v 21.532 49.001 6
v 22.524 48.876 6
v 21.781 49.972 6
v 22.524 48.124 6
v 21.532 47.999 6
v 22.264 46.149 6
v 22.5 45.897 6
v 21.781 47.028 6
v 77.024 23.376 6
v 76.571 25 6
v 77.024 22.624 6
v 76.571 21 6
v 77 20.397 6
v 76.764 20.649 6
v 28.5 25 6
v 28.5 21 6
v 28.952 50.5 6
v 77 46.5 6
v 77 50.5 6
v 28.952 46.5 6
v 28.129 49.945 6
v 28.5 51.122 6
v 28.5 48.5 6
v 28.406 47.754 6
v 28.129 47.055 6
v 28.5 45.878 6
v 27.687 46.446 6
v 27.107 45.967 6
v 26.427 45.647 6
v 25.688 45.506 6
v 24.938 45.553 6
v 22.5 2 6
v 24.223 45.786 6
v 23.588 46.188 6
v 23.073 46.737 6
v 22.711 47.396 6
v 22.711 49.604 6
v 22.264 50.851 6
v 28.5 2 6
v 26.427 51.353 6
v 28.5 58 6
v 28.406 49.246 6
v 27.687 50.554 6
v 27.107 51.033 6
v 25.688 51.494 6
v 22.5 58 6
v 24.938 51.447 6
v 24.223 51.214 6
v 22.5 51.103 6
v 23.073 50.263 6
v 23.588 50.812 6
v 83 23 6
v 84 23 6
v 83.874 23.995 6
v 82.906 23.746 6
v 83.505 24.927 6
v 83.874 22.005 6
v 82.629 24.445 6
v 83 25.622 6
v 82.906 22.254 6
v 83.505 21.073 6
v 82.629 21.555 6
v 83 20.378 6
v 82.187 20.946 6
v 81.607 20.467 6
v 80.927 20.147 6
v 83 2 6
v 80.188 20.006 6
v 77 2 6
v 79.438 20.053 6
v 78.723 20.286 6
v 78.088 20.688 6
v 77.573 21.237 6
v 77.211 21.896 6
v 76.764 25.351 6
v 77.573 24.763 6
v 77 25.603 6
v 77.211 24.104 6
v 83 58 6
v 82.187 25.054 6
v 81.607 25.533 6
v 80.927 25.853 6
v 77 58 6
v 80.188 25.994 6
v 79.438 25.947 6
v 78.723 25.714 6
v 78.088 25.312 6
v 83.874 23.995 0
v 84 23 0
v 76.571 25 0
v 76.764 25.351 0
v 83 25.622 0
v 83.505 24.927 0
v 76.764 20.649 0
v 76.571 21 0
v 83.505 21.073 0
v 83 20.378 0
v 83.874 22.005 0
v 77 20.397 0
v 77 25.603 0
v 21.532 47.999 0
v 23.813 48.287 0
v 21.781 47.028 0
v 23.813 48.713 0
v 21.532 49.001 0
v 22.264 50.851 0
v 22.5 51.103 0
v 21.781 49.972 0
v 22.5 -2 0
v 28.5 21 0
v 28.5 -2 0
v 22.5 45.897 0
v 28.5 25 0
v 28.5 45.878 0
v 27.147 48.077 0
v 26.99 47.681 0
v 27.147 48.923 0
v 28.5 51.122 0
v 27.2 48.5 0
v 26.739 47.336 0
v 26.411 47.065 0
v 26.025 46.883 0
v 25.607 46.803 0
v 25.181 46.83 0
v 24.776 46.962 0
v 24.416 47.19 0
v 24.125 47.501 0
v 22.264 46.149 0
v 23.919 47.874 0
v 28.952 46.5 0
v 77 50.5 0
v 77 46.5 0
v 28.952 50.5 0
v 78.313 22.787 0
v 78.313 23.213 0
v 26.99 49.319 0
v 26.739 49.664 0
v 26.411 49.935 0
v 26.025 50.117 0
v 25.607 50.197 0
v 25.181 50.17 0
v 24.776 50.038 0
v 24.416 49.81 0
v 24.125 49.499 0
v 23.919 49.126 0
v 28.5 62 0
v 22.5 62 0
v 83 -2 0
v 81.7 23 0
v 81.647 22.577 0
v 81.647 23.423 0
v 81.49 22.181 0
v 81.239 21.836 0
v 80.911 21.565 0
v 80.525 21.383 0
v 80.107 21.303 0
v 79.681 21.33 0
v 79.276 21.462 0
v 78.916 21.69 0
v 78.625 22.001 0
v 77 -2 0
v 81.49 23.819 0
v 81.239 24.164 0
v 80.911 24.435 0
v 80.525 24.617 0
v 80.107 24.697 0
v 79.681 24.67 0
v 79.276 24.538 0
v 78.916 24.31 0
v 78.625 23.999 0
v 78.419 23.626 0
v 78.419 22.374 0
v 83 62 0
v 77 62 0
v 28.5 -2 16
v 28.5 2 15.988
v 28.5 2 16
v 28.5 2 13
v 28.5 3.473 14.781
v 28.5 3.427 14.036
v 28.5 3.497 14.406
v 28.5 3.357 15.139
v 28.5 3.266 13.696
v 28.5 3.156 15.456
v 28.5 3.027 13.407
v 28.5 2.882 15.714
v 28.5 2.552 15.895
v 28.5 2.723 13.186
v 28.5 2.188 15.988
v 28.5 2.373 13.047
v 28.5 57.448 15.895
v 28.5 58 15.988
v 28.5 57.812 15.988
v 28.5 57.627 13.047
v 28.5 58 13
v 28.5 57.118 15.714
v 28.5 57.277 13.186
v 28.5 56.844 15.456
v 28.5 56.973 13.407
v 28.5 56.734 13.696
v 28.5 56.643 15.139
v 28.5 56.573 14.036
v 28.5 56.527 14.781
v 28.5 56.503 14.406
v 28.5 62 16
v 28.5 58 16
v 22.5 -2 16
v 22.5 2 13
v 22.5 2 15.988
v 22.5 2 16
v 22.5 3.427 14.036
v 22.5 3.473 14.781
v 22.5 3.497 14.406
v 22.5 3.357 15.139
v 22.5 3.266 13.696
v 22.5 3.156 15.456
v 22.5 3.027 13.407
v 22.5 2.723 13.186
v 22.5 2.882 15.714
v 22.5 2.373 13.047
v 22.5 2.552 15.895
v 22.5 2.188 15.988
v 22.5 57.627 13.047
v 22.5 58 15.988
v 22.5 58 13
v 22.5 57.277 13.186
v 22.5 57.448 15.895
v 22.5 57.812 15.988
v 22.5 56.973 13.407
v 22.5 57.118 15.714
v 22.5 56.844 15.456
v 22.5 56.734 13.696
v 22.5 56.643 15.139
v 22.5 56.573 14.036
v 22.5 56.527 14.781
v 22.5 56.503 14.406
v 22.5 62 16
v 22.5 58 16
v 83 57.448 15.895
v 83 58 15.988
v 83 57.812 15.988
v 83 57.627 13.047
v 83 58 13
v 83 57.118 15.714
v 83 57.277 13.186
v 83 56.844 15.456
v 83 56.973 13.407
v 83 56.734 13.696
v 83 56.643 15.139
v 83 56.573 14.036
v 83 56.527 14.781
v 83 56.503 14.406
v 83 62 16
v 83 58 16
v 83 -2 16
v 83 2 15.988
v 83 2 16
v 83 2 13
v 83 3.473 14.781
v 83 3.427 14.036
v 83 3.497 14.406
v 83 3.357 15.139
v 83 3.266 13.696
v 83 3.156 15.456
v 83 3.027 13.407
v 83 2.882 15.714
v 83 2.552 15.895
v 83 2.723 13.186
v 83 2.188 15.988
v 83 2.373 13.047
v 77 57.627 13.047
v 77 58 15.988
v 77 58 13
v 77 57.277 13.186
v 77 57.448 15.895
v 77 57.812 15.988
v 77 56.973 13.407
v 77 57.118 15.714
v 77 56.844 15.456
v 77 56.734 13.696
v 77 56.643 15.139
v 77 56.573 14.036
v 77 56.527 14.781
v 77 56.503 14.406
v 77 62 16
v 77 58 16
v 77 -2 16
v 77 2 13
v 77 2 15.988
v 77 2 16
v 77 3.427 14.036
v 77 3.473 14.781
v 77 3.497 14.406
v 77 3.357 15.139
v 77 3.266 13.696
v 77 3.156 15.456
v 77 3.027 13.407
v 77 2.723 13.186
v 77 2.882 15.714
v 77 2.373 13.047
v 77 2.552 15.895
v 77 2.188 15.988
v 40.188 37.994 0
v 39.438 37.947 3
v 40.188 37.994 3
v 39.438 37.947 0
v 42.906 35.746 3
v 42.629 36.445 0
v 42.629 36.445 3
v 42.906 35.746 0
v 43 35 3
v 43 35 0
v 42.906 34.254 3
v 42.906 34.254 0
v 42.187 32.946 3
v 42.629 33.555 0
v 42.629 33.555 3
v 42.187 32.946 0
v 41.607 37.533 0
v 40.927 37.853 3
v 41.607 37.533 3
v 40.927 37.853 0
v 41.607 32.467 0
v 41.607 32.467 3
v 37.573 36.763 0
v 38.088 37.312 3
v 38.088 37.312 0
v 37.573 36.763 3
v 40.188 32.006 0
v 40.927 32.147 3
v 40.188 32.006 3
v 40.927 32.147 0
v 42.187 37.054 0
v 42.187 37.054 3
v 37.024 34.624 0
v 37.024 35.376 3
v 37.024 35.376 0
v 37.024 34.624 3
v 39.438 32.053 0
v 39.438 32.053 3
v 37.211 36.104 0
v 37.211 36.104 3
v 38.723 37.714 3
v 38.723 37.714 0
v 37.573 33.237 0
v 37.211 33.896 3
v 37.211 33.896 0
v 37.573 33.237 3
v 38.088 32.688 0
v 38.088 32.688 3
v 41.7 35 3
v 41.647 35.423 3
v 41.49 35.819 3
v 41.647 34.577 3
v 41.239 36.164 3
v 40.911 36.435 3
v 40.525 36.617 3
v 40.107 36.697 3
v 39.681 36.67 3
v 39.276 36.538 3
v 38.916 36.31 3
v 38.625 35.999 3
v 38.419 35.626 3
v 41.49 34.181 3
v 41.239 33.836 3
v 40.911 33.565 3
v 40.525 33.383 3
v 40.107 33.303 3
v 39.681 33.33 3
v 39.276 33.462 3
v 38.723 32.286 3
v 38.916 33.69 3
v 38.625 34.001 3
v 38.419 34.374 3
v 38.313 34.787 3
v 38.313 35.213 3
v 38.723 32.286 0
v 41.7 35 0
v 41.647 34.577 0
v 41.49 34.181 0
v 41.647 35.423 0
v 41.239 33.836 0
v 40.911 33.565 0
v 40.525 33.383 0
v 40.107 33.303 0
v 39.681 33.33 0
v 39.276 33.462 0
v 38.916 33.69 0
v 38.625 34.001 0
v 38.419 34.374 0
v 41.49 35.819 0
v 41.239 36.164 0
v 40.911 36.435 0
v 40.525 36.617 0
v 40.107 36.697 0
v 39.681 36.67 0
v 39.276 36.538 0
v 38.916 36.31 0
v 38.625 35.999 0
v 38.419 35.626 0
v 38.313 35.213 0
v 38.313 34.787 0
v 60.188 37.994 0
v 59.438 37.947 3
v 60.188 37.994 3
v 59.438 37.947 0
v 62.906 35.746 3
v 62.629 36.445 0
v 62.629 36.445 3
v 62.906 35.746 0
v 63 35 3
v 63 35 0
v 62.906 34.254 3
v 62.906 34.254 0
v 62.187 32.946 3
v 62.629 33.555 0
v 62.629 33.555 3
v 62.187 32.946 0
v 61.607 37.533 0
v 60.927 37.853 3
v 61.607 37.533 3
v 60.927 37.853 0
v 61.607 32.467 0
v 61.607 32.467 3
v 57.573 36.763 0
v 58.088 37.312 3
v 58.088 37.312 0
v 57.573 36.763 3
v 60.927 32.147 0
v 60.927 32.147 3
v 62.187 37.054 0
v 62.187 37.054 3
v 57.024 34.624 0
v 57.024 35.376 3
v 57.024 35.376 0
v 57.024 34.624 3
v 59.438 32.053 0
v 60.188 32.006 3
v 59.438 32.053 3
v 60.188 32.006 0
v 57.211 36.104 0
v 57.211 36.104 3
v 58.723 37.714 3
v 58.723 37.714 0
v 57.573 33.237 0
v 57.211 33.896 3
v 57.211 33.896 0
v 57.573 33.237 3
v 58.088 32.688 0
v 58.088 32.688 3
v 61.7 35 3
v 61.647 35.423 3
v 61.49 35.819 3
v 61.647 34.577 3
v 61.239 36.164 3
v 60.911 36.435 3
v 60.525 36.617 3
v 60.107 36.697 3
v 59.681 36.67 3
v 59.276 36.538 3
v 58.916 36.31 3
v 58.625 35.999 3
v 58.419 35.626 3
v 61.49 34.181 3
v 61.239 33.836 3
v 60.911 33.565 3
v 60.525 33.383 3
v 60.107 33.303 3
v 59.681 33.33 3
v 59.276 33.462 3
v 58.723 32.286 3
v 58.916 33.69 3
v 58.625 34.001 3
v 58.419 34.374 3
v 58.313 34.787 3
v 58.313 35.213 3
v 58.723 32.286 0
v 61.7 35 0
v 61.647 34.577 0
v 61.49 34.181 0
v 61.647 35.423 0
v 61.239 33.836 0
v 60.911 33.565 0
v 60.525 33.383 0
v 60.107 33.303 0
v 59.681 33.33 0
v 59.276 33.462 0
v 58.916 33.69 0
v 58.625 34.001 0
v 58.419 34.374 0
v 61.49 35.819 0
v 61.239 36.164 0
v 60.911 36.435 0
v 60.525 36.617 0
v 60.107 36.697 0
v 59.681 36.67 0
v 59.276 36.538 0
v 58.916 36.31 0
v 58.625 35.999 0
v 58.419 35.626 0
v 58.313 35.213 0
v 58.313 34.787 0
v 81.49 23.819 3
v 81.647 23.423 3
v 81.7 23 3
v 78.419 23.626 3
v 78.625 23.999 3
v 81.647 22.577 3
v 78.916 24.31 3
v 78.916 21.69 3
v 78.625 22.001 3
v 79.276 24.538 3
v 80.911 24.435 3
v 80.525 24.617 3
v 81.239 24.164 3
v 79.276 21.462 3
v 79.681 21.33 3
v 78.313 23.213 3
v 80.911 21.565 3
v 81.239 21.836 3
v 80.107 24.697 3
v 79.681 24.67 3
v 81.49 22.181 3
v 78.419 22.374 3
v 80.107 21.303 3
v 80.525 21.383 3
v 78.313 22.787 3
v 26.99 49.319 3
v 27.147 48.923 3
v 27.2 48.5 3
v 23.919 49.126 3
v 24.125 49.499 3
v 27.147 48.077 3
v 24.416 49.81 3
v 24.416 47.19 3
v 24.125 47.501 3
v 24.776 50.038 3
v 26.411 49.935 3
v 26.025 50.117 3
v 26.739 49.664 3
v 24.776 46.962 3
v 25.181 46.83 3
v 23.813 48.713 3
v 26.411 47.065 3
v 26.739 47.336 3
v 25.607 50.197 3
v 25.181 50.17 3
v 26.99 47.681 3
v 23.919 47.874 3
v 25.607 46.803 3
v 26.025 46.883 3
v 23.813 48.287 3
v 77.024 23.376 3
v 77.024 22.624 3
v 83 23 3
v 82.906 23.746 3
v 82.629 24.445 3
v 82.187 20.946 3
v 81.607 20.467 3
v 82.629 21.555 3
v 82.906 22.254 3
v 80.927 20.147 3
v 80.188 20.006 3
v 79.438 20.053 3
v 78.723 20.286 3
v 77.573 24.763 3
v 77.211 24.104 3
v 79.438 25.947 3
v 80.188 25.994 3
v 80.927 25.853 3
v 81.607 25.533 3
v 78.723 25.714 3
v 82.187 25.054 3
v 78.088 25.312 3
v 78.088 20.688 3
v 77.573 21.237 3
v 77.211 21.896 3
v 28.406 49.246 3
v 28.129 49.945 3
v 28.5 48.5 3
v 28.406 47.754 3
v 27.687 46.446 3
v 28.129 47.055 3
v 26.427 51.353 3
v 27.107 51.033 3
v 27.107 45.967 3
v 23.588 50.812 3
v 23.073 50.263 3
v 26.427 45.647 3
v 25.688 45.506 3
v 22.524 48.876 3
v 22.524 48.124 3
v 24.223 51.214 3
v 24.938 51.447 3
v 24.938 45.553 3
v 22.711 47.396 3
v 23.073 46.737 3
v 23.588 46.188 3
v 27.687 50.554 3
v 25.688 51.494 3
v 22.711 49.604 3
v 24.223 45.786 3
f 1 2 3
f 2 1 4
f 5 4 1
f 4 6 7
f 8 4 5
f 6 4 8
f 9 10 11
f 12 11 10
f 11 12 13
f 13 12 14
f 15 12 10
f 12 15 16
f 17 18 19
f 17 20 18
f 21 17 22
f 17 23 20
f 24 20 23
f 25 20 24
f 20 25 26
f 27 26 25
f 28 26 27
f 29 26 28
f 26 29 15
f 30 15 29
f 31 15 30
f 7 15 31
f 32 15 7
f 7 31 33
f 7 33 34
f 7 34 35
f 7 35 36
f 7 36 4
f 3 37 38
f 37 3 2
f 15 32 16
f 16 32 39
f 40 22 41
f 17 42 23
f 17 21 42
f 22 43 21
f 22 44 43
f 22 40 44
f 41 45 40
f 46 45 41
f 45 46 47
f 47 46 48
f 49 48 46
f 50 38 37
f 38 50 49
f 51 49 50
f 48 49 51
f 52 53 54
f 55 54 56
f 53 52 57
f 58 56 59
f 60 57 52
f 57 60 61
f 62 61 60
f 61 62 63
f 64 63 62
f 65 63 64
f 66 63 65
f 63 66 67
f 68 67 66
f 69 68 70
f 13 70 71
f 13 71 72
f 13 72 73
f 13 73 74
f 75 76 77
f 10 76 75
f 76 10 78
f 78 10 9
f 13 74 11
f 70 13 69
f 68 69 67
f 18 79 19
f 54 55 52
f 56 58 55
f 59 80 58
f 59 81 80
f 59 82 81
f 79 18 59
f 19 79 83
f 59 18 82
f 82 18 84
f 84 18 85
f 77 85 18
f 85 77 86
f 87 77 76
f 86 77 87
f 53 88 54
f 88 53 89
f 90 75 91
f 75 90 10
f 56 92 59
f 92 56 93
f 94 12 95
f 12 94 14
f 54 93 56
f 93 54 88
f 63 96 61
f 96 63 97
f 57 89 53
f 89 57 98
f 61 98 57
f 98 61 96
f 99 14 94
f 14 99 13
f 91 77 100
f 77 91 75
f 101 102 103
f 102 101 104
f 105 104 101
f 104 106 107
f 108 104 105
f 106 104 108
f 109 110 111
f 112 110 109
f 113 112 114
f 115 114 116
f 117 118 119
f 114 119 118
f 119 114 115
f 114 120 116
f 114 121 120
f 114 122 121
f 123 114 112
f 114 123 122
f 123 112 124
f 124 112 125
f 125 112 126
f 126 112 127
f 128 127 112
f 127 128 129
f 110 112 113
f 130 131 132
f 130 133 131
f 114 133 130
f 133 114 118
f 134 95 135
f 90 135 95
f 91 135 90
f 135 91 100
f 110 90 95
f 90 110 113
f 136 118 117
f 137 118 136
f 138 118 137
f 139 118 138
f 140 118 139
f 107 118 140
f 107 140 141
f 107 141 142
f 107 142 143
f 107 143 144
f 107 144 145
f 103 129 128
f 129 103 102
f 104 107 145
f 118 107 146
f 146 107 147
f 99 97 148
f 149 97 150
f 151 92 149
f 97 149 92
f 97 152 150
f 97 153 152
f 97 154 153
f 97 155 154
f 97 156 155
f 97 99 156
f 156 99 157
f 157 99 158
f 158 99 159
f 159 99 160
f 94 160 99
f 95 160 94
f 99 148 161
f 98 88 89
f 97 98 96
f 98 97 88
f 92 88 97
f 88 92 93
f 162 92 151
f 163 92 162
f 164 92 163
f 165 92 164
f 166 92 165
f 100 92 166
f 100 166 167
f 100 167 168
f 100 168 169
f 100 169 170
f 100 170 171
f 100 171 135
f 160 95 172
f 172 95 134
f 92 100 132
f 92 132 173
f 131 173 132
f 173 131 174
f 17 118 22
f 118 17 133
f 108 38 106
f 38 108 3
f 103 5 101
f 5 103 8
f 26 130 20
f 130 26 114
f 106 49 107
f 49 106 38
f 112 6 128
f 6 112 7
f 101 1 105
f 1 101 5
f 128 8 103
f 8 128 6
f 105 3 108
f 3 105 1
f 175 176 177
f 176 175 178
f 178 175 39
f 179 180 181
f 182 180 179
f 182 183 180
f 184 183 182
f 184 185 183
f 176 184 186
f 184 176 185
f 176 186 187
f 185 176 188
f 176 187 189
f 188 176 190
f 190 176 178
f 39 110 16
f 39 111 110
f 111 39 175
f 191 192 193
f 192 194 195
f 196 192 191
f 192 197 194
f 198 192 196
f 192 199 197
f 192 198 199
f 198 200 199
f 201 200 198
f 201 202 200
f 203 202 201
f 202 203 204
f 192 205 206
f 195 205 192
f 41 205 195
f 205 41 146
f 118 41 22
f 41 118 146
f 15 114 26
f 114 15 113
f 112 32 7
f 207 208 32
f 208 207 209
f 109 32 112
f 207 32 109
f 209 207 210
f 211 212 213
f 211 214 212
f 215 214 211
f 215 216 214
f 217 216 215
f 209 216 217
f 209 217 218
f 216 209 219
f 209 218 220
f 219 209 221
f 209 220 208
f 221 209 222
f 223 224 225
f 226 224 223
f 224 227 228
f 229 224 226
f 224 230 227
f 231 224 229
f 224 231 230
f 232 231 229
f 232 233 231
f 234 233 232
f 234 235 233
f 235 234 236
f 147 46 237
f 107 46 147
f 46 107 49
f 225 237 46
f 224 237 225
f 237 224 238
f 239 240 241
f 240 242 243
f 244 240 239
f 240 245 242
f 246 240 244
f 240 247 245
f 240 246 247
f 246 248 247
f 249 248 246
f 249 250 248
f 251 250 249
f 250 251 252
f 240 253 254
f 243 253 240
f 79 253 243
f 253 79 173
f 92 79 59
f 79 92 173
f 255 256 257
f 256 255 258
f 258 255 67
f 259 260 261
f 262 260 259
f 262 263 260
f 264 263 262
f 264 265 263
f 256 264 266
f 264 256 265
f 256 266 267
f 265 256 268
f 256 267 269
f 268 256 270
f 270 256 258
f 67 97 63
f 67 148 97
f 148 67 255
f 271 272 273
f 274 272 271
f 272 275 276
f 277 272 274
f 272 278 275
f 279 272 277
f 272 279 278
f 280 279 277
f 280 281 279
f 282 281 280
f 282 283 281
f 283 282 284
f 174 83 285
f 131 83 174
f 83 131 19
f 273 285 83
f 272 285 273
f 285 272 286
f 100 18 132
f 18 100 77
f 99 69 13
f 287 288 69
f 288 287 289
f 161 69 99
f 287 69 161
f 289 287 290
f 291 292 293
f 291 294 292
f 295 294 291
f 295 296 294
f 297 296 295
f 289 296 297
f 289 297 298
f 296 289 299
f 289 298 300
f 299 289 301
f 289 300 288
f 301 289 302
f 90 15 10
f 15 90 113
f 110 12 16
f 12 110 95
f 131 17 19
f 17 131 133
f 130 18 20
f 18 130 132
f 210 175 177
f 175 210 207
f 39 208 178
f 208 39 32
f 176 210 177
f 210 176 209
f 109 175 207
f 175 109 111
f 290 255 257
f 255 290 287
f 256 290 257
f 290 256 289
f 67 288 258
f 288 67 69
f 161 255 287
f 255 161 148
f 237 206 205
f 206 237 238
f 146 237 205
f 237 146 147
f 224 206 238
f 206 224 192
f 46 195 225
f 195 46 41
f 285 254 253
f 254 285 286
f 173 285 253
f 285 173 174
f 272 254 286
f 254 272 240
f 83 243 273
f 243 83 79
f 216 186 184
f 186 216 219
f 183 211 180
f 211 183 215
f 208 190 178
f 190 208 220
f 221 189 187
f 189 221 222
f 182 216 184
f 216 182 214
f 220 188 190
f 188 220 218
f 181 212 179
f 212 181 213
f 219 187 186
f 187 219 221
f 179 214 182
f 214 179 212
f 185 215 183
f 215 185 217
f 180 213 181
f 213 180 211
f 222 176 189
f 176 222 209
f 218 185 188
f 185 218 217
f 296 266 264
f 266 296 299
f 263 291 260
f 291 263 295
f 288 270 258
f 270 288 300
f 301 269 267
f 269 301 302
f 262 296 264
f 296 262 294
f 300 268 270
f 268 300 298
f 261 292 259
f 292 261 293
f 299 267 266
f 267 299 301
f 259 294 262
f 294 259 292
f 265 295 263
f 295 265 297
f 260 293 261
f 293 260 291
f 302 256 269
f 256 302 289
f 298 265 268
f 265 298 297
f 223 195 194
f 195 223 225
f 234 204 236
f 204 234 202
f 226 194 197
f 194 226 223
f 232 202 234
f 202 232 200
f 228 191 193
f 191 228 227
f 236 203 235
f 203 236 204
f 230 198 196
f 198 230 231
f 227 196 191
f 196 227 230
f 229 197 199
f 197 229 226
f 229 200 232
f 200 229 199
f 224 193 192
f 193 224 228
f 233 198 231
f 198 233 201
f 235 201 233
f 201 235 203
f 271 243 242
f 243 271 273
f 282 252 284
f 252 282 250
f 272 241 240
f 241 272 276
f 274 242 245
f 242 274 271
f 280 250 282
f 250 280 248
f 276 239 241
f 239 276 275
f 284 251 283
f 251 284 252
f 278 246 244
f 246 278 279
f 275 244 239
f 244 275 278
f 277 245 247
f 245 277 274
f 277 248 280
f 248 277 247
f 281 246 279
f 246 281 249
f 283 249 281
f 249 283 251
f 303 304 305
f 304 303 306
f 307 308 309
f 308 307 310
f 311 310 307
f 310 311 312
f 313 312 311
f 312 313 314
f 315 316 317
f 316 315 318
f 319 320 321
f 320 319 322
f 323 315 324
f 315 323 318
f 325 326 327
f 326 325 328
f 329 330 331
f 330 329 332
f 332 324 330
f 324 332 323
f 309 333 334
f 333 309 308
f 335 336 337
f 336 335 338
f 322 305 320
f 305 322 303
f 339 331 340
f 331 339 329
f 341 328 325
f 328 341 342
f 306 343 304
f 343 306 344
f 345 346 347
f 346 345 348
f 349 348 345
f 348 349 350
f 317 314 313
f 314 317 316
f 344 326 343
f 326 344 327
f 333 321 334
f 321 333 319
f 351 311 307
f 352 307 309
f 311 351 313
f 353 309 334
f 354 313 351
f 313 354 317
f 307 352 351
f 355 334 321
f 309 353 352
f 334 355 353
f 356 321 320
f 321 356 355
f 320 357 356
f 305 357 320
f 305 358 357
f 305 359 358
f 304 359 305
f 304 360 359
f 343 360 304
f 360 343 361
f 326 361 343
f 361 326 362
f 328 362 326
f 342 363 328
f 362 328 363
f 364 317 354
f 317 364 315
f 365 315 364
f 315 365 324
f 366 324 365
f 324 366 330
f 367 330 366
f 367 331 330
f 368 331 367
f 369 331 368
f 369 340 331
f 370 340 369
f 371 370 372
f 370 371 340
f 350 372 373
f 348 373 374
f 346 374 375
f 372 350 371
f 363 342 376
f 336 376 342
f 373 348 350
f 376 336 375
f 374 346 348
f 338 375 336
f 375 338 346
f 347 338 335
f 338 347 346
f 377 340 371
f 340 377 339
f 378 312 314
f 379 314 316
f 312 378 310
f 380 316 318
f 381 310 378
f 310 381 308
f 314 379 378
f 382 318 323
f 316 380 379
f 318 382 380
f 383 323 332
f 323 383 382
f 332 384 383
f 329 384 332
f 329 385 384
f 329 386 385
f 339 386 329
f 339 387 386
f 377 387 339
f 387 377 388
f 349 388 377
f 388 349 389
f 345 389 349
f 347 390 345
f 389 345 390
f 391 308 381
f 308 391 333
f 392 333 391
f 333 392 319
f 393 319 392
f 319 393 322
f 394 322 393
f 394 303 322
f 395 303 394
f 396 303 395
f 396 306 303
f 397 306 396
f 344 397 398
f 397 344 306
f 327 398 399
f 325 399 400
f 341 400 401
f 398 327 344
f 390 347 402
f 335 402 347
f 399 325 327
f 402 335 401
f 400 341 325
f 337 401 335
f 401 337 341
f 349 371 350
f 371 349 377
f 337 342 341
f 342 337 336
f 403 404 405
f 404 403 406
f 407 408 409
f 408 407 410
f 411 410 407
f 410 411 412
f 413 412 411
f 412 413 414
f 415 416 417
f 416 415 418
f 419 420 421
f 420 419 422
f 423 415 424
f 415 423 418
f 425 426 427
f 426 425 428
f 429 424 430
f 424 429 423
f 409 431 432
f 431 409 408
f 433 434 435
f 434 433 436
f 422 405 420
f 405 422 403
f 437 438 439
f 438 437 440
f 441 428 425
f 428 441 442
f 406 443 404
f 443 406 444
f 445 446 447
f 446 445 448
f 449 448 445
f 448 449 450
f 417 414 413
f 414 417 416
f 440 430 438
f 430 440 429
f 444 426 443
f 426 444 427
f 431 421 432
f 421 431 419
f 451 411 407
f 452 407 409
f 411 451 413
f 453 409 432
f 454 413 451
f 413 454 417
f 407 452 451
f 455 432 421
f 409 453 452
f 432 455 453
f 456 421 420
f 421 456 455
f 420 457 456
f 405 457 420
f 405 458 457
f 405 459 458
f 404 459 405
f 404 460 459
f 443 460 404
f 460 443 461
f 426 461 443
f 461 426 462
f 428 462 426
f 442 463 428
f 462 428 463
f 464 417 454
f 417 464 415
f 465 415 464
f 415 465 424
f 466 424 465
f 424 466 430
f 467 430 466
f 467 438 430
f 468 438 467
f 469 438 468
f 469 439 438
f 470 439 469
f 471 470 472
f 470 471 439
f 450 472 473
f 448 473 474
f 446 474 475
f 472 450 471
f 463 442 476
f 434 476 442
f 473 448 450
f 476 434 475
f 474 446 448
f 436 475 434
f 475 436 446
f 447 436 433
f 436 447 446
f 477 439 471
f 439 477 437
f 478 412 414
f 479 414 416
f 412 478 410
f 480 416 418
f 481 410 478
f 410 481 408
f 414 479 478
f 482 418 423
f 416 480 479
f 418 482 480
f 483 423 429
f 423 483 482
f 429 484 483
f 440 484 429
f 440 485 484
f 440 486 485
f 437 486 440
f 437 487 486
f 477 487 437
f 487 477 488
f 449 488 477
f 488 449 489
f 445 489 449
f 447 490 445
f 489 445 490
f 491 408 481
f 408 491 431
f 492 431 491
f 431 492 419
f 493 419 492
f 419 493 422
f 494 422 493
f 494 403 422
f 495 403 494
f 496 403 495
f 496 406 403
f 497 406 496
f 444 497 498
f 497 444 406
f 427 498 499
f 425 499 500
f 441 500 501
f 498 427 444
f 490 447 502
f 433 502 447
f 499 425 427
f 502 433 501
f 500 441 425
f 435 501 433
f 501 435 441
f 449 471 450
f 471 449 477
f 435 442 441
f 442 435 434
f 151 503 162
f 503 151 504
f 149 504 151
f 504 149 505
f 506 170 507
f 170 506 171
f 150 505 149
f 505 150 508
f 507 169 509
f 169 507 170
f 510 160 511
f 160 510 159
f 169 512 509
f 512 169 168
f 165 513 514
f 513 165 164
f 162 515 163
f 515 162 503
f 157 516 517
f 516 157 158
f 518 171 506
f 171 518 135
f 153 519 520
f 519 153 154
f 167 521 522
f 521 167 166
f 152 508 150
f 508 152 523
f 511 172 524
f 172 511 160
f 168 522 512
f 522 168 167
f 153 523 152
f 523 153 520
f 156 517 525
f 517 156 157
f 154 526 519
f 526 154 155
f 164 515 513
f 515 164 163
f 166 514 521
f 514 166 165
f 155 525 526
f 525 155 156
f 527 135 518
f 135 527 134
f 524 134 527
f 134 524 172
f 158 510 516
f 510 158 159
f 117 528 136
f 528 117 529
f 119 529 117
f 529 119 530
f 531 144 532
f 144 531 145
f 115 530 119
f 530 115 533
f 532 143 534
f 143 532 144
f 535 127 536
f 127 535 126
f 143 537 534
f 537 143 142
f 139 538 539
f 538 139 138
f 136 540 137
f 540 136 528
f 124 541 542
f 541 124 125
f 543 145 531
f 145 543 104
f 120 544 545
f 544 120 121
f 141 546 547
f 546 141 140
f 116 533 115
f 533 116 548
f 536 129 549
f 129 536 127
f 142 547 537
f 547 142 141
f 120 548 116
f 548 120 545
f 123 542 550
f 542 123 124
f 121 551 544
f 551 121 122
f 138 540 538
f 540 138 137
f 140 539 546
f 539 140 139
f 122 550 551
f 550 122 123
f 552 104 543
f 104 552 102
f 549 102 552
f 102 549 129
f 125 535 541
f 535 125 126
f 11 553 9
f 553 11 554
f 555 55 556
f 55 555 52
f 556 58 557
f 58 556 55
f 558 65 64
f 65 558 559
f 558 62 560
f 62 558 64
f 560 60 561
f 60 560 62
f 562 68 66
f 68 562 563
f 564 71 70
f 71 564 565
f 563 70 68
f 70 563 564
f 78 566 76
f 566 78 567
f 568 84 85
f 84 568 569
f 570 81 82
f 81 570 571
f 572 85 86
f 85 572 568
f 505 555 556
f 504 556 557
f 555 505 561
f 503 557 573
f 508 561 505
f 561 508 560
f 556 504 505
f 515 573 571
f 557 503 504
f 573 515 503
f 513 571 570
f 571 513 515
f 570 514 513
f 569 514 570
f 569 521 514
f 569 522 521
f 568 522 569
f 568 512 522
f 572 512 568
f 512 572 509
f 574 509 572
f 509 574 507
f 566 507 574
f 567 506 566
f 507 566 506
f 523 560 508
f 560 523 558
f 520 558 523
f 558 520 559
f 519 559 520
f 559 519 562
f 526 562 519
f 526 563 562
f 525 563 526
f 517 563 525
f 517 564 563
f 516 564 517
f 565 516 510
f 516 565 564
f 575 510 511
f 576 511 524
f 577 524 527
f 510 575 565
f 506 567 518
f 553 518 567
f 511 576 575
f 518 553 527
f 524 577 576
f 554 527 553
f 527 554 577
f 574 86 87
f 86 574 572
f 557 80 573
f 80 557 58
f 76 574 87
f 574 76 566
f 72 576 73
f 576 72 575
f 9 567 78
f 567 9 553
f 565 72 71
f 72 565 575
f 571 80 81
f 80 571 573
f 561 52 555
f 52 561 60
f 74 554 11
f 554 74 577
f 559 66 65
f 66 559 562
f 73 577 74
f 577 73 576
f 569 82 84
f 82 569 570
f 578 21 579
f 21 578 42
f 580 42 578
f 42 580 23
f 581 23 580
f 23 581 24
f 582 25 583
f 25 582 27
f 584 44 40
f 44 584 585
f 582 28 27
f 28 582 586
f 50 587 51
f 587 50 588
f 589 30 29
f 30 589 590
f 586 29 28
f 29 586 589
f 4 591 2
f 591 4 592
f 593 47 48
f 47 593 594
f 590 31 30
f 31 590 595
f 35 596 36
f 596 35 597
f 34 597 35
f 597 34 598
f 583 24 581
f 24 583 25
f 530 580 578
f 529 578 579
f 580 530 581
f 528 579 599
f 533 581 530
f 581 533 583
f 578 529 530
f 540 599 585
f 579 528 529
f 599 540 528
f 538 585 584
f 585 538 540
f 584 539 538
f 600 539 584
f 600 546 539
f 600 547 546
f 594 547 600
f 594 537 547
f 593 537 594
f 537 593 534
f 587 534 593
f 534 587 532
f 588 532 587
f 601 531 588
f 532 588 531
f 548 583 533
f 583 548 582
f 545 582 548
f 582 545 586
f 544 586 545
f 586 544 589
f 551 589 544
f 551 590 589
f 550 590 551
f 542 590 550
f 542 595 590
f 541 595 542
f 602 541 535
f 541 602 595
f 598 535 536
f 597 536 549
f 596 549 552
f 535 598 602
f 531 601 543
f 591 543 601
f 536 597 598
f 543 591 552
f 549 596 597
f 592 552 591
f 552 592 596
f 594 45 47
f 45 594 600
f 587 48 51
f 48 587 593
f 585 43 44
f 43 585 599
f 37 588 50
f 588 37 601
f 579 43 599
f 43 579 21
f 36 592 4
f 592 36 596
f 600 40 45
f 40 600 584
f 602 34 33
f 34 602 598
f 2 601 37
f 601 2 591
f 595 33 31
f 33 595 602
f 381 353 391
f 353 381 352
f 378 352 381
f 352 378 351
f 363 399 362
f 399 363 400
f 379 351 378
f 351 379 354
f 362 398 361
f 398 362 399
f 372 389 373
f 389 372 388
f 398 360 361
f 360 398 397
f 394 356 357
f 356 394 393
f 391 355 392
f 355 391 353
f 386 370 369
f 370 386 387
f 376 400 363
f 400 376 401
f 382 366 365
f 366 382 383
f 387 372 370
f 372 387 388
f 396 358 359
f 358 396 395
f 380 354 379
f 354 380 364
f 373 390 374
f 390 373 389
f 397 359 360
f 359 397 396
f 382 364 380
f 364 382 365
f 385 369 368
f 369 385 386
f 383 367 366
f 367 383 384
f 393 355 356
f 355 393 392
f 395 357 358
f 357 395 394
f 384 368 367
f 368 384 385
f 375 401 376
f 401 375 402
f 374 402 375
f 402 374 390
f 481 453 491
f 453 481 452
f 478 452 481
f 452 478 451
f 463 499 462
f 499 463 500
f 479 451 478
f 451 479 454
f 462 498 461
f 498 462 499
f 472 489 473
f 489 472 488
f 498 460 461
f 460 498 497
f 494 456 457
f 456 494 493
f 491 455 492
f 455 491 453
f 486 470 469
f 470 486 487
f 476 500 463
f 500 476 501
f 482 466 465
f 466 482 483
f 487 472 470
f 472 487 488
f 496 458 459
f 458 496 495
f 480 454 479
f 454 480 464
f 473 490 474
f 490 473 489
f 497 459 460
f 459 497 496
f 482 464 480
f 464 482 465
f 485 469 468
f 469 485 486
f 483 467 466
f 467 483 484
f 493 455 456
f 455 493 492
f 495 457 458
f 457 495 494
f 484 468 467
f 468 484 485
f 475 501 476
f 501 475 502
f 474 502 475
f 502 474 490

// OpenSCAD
uprightsThick = 4;
translate([0,0,0]) 
rotate(a=0, v=[0,0,0]) 
difference()
{
	union()
	{
	

	//Mounting pads
	color("green") translate([80,18+5,0]) rotate(a=0, v=[0,0,0]) cylinder(r=4, h=6, $fn=25);
	color("green") translate([25.5,43.5+5,0]) rotate(a=0, v=[0,0,0]) cylinder(r=4, h=6, $fn=25);


	//Frame

	//Vertical parts
	translate([25.5-3,0,0]) rotate([0,0,0]) cube([6,60-1,6]);
	translate([80-3,0,0]) rotate([0,0,0]) cube([6,60-1,6]);

	//Horizontal parts
	translate([25.5,18+5-2,0]) rotate([0,0,0]) cube([54.5,4,6]);
	translate([25.5,56+5-12.5-2,0]) rotate([0,0,0]) cube([54.5,4,6]);

	//Pi Clips
	
	//Uprights
	translate([25.5-3,0-uprightsThick/2,0]) rotate([0,0,0]) cube([6,uprightsThick,14+2]);
	translate([80-3,0-uprightsThick/2,0]) rotate([0,0,0]) cube([6,uprightsThick,14+2]);
	translate([25.5-3,60-2,0]) rotate([0,0,0]) cube([6,uprightsThick,14+2]);
	translate([80-3,60-2,0]) rotate([0,0,0]) cube([6,uprightsThick,14+2]);	

	//Clips
	color("red") translate([25.5-3,2,12.5+2]) rotate(a=90, v=[0,1,0]) cylinder(r=1.5, h=6, $fn=25);
	color("red") translate([80-3,2,12.5+2]) rotate(a=90, v=[0,1,0]) cylinder(r=1.5, h=6, $fn=25);
	color("red") translate([25.5-3,60-2,12.5+2]) rotate(a=90, v=[0,1,0]) cylinder(r=1.5, h=6, $fn=25);
	color("red") translate([80-3,60-2,12.5+2]) rotate(a=90, v=[0,1,0]) cylinder(r=1.5, h=6, $fn=25);

	//Spacer pads
	color("green") translate([40,30+5,0]) rotate(a=0, v=[0,0,0]) cylinder(r=3, h=3, $fn=25);
	color("green") translate([60,30+5,0]) rotate(a=0, v=[0,0,0]) cylinder(r=3, h=3, $fn=25);

	}

	union()
	{
	
	//Mounting holes
	color("red") translate([80,18+5,-1]) rotate(a=0, v=[0,0,0]) cylinder(r=1.7, h=10, $fn=25);
	color("red") translate([25.5,43.5+5,-1]) rotate(a=0, v=[0,0,0]) cylinder(r=1.7, h=10, $fn=25);

	//Countersink holes
	color("red") translate([80,18+5,3]) rotate(a=0, v=[0,0,0]) cylinder(r=3, h=4, $fn=25);
	color("red") translate([25.5,43.5+5,3]) rotate(a=0, v=[0,0,0]) cylinder(r=3, h=4, $fn=25);

	//Spacer pad holes
	color("red") translate([40,30+5,-1]) rotate(a=0, v=[0,0,0]) cylinder(r=1.7, h=10, $fn=25);
	color("red") translate([60,30+5,-1]) rotate(a=0, v=[0,0,0]) cylinder(r=1.7, h=10, $fn=25);


	}
}
